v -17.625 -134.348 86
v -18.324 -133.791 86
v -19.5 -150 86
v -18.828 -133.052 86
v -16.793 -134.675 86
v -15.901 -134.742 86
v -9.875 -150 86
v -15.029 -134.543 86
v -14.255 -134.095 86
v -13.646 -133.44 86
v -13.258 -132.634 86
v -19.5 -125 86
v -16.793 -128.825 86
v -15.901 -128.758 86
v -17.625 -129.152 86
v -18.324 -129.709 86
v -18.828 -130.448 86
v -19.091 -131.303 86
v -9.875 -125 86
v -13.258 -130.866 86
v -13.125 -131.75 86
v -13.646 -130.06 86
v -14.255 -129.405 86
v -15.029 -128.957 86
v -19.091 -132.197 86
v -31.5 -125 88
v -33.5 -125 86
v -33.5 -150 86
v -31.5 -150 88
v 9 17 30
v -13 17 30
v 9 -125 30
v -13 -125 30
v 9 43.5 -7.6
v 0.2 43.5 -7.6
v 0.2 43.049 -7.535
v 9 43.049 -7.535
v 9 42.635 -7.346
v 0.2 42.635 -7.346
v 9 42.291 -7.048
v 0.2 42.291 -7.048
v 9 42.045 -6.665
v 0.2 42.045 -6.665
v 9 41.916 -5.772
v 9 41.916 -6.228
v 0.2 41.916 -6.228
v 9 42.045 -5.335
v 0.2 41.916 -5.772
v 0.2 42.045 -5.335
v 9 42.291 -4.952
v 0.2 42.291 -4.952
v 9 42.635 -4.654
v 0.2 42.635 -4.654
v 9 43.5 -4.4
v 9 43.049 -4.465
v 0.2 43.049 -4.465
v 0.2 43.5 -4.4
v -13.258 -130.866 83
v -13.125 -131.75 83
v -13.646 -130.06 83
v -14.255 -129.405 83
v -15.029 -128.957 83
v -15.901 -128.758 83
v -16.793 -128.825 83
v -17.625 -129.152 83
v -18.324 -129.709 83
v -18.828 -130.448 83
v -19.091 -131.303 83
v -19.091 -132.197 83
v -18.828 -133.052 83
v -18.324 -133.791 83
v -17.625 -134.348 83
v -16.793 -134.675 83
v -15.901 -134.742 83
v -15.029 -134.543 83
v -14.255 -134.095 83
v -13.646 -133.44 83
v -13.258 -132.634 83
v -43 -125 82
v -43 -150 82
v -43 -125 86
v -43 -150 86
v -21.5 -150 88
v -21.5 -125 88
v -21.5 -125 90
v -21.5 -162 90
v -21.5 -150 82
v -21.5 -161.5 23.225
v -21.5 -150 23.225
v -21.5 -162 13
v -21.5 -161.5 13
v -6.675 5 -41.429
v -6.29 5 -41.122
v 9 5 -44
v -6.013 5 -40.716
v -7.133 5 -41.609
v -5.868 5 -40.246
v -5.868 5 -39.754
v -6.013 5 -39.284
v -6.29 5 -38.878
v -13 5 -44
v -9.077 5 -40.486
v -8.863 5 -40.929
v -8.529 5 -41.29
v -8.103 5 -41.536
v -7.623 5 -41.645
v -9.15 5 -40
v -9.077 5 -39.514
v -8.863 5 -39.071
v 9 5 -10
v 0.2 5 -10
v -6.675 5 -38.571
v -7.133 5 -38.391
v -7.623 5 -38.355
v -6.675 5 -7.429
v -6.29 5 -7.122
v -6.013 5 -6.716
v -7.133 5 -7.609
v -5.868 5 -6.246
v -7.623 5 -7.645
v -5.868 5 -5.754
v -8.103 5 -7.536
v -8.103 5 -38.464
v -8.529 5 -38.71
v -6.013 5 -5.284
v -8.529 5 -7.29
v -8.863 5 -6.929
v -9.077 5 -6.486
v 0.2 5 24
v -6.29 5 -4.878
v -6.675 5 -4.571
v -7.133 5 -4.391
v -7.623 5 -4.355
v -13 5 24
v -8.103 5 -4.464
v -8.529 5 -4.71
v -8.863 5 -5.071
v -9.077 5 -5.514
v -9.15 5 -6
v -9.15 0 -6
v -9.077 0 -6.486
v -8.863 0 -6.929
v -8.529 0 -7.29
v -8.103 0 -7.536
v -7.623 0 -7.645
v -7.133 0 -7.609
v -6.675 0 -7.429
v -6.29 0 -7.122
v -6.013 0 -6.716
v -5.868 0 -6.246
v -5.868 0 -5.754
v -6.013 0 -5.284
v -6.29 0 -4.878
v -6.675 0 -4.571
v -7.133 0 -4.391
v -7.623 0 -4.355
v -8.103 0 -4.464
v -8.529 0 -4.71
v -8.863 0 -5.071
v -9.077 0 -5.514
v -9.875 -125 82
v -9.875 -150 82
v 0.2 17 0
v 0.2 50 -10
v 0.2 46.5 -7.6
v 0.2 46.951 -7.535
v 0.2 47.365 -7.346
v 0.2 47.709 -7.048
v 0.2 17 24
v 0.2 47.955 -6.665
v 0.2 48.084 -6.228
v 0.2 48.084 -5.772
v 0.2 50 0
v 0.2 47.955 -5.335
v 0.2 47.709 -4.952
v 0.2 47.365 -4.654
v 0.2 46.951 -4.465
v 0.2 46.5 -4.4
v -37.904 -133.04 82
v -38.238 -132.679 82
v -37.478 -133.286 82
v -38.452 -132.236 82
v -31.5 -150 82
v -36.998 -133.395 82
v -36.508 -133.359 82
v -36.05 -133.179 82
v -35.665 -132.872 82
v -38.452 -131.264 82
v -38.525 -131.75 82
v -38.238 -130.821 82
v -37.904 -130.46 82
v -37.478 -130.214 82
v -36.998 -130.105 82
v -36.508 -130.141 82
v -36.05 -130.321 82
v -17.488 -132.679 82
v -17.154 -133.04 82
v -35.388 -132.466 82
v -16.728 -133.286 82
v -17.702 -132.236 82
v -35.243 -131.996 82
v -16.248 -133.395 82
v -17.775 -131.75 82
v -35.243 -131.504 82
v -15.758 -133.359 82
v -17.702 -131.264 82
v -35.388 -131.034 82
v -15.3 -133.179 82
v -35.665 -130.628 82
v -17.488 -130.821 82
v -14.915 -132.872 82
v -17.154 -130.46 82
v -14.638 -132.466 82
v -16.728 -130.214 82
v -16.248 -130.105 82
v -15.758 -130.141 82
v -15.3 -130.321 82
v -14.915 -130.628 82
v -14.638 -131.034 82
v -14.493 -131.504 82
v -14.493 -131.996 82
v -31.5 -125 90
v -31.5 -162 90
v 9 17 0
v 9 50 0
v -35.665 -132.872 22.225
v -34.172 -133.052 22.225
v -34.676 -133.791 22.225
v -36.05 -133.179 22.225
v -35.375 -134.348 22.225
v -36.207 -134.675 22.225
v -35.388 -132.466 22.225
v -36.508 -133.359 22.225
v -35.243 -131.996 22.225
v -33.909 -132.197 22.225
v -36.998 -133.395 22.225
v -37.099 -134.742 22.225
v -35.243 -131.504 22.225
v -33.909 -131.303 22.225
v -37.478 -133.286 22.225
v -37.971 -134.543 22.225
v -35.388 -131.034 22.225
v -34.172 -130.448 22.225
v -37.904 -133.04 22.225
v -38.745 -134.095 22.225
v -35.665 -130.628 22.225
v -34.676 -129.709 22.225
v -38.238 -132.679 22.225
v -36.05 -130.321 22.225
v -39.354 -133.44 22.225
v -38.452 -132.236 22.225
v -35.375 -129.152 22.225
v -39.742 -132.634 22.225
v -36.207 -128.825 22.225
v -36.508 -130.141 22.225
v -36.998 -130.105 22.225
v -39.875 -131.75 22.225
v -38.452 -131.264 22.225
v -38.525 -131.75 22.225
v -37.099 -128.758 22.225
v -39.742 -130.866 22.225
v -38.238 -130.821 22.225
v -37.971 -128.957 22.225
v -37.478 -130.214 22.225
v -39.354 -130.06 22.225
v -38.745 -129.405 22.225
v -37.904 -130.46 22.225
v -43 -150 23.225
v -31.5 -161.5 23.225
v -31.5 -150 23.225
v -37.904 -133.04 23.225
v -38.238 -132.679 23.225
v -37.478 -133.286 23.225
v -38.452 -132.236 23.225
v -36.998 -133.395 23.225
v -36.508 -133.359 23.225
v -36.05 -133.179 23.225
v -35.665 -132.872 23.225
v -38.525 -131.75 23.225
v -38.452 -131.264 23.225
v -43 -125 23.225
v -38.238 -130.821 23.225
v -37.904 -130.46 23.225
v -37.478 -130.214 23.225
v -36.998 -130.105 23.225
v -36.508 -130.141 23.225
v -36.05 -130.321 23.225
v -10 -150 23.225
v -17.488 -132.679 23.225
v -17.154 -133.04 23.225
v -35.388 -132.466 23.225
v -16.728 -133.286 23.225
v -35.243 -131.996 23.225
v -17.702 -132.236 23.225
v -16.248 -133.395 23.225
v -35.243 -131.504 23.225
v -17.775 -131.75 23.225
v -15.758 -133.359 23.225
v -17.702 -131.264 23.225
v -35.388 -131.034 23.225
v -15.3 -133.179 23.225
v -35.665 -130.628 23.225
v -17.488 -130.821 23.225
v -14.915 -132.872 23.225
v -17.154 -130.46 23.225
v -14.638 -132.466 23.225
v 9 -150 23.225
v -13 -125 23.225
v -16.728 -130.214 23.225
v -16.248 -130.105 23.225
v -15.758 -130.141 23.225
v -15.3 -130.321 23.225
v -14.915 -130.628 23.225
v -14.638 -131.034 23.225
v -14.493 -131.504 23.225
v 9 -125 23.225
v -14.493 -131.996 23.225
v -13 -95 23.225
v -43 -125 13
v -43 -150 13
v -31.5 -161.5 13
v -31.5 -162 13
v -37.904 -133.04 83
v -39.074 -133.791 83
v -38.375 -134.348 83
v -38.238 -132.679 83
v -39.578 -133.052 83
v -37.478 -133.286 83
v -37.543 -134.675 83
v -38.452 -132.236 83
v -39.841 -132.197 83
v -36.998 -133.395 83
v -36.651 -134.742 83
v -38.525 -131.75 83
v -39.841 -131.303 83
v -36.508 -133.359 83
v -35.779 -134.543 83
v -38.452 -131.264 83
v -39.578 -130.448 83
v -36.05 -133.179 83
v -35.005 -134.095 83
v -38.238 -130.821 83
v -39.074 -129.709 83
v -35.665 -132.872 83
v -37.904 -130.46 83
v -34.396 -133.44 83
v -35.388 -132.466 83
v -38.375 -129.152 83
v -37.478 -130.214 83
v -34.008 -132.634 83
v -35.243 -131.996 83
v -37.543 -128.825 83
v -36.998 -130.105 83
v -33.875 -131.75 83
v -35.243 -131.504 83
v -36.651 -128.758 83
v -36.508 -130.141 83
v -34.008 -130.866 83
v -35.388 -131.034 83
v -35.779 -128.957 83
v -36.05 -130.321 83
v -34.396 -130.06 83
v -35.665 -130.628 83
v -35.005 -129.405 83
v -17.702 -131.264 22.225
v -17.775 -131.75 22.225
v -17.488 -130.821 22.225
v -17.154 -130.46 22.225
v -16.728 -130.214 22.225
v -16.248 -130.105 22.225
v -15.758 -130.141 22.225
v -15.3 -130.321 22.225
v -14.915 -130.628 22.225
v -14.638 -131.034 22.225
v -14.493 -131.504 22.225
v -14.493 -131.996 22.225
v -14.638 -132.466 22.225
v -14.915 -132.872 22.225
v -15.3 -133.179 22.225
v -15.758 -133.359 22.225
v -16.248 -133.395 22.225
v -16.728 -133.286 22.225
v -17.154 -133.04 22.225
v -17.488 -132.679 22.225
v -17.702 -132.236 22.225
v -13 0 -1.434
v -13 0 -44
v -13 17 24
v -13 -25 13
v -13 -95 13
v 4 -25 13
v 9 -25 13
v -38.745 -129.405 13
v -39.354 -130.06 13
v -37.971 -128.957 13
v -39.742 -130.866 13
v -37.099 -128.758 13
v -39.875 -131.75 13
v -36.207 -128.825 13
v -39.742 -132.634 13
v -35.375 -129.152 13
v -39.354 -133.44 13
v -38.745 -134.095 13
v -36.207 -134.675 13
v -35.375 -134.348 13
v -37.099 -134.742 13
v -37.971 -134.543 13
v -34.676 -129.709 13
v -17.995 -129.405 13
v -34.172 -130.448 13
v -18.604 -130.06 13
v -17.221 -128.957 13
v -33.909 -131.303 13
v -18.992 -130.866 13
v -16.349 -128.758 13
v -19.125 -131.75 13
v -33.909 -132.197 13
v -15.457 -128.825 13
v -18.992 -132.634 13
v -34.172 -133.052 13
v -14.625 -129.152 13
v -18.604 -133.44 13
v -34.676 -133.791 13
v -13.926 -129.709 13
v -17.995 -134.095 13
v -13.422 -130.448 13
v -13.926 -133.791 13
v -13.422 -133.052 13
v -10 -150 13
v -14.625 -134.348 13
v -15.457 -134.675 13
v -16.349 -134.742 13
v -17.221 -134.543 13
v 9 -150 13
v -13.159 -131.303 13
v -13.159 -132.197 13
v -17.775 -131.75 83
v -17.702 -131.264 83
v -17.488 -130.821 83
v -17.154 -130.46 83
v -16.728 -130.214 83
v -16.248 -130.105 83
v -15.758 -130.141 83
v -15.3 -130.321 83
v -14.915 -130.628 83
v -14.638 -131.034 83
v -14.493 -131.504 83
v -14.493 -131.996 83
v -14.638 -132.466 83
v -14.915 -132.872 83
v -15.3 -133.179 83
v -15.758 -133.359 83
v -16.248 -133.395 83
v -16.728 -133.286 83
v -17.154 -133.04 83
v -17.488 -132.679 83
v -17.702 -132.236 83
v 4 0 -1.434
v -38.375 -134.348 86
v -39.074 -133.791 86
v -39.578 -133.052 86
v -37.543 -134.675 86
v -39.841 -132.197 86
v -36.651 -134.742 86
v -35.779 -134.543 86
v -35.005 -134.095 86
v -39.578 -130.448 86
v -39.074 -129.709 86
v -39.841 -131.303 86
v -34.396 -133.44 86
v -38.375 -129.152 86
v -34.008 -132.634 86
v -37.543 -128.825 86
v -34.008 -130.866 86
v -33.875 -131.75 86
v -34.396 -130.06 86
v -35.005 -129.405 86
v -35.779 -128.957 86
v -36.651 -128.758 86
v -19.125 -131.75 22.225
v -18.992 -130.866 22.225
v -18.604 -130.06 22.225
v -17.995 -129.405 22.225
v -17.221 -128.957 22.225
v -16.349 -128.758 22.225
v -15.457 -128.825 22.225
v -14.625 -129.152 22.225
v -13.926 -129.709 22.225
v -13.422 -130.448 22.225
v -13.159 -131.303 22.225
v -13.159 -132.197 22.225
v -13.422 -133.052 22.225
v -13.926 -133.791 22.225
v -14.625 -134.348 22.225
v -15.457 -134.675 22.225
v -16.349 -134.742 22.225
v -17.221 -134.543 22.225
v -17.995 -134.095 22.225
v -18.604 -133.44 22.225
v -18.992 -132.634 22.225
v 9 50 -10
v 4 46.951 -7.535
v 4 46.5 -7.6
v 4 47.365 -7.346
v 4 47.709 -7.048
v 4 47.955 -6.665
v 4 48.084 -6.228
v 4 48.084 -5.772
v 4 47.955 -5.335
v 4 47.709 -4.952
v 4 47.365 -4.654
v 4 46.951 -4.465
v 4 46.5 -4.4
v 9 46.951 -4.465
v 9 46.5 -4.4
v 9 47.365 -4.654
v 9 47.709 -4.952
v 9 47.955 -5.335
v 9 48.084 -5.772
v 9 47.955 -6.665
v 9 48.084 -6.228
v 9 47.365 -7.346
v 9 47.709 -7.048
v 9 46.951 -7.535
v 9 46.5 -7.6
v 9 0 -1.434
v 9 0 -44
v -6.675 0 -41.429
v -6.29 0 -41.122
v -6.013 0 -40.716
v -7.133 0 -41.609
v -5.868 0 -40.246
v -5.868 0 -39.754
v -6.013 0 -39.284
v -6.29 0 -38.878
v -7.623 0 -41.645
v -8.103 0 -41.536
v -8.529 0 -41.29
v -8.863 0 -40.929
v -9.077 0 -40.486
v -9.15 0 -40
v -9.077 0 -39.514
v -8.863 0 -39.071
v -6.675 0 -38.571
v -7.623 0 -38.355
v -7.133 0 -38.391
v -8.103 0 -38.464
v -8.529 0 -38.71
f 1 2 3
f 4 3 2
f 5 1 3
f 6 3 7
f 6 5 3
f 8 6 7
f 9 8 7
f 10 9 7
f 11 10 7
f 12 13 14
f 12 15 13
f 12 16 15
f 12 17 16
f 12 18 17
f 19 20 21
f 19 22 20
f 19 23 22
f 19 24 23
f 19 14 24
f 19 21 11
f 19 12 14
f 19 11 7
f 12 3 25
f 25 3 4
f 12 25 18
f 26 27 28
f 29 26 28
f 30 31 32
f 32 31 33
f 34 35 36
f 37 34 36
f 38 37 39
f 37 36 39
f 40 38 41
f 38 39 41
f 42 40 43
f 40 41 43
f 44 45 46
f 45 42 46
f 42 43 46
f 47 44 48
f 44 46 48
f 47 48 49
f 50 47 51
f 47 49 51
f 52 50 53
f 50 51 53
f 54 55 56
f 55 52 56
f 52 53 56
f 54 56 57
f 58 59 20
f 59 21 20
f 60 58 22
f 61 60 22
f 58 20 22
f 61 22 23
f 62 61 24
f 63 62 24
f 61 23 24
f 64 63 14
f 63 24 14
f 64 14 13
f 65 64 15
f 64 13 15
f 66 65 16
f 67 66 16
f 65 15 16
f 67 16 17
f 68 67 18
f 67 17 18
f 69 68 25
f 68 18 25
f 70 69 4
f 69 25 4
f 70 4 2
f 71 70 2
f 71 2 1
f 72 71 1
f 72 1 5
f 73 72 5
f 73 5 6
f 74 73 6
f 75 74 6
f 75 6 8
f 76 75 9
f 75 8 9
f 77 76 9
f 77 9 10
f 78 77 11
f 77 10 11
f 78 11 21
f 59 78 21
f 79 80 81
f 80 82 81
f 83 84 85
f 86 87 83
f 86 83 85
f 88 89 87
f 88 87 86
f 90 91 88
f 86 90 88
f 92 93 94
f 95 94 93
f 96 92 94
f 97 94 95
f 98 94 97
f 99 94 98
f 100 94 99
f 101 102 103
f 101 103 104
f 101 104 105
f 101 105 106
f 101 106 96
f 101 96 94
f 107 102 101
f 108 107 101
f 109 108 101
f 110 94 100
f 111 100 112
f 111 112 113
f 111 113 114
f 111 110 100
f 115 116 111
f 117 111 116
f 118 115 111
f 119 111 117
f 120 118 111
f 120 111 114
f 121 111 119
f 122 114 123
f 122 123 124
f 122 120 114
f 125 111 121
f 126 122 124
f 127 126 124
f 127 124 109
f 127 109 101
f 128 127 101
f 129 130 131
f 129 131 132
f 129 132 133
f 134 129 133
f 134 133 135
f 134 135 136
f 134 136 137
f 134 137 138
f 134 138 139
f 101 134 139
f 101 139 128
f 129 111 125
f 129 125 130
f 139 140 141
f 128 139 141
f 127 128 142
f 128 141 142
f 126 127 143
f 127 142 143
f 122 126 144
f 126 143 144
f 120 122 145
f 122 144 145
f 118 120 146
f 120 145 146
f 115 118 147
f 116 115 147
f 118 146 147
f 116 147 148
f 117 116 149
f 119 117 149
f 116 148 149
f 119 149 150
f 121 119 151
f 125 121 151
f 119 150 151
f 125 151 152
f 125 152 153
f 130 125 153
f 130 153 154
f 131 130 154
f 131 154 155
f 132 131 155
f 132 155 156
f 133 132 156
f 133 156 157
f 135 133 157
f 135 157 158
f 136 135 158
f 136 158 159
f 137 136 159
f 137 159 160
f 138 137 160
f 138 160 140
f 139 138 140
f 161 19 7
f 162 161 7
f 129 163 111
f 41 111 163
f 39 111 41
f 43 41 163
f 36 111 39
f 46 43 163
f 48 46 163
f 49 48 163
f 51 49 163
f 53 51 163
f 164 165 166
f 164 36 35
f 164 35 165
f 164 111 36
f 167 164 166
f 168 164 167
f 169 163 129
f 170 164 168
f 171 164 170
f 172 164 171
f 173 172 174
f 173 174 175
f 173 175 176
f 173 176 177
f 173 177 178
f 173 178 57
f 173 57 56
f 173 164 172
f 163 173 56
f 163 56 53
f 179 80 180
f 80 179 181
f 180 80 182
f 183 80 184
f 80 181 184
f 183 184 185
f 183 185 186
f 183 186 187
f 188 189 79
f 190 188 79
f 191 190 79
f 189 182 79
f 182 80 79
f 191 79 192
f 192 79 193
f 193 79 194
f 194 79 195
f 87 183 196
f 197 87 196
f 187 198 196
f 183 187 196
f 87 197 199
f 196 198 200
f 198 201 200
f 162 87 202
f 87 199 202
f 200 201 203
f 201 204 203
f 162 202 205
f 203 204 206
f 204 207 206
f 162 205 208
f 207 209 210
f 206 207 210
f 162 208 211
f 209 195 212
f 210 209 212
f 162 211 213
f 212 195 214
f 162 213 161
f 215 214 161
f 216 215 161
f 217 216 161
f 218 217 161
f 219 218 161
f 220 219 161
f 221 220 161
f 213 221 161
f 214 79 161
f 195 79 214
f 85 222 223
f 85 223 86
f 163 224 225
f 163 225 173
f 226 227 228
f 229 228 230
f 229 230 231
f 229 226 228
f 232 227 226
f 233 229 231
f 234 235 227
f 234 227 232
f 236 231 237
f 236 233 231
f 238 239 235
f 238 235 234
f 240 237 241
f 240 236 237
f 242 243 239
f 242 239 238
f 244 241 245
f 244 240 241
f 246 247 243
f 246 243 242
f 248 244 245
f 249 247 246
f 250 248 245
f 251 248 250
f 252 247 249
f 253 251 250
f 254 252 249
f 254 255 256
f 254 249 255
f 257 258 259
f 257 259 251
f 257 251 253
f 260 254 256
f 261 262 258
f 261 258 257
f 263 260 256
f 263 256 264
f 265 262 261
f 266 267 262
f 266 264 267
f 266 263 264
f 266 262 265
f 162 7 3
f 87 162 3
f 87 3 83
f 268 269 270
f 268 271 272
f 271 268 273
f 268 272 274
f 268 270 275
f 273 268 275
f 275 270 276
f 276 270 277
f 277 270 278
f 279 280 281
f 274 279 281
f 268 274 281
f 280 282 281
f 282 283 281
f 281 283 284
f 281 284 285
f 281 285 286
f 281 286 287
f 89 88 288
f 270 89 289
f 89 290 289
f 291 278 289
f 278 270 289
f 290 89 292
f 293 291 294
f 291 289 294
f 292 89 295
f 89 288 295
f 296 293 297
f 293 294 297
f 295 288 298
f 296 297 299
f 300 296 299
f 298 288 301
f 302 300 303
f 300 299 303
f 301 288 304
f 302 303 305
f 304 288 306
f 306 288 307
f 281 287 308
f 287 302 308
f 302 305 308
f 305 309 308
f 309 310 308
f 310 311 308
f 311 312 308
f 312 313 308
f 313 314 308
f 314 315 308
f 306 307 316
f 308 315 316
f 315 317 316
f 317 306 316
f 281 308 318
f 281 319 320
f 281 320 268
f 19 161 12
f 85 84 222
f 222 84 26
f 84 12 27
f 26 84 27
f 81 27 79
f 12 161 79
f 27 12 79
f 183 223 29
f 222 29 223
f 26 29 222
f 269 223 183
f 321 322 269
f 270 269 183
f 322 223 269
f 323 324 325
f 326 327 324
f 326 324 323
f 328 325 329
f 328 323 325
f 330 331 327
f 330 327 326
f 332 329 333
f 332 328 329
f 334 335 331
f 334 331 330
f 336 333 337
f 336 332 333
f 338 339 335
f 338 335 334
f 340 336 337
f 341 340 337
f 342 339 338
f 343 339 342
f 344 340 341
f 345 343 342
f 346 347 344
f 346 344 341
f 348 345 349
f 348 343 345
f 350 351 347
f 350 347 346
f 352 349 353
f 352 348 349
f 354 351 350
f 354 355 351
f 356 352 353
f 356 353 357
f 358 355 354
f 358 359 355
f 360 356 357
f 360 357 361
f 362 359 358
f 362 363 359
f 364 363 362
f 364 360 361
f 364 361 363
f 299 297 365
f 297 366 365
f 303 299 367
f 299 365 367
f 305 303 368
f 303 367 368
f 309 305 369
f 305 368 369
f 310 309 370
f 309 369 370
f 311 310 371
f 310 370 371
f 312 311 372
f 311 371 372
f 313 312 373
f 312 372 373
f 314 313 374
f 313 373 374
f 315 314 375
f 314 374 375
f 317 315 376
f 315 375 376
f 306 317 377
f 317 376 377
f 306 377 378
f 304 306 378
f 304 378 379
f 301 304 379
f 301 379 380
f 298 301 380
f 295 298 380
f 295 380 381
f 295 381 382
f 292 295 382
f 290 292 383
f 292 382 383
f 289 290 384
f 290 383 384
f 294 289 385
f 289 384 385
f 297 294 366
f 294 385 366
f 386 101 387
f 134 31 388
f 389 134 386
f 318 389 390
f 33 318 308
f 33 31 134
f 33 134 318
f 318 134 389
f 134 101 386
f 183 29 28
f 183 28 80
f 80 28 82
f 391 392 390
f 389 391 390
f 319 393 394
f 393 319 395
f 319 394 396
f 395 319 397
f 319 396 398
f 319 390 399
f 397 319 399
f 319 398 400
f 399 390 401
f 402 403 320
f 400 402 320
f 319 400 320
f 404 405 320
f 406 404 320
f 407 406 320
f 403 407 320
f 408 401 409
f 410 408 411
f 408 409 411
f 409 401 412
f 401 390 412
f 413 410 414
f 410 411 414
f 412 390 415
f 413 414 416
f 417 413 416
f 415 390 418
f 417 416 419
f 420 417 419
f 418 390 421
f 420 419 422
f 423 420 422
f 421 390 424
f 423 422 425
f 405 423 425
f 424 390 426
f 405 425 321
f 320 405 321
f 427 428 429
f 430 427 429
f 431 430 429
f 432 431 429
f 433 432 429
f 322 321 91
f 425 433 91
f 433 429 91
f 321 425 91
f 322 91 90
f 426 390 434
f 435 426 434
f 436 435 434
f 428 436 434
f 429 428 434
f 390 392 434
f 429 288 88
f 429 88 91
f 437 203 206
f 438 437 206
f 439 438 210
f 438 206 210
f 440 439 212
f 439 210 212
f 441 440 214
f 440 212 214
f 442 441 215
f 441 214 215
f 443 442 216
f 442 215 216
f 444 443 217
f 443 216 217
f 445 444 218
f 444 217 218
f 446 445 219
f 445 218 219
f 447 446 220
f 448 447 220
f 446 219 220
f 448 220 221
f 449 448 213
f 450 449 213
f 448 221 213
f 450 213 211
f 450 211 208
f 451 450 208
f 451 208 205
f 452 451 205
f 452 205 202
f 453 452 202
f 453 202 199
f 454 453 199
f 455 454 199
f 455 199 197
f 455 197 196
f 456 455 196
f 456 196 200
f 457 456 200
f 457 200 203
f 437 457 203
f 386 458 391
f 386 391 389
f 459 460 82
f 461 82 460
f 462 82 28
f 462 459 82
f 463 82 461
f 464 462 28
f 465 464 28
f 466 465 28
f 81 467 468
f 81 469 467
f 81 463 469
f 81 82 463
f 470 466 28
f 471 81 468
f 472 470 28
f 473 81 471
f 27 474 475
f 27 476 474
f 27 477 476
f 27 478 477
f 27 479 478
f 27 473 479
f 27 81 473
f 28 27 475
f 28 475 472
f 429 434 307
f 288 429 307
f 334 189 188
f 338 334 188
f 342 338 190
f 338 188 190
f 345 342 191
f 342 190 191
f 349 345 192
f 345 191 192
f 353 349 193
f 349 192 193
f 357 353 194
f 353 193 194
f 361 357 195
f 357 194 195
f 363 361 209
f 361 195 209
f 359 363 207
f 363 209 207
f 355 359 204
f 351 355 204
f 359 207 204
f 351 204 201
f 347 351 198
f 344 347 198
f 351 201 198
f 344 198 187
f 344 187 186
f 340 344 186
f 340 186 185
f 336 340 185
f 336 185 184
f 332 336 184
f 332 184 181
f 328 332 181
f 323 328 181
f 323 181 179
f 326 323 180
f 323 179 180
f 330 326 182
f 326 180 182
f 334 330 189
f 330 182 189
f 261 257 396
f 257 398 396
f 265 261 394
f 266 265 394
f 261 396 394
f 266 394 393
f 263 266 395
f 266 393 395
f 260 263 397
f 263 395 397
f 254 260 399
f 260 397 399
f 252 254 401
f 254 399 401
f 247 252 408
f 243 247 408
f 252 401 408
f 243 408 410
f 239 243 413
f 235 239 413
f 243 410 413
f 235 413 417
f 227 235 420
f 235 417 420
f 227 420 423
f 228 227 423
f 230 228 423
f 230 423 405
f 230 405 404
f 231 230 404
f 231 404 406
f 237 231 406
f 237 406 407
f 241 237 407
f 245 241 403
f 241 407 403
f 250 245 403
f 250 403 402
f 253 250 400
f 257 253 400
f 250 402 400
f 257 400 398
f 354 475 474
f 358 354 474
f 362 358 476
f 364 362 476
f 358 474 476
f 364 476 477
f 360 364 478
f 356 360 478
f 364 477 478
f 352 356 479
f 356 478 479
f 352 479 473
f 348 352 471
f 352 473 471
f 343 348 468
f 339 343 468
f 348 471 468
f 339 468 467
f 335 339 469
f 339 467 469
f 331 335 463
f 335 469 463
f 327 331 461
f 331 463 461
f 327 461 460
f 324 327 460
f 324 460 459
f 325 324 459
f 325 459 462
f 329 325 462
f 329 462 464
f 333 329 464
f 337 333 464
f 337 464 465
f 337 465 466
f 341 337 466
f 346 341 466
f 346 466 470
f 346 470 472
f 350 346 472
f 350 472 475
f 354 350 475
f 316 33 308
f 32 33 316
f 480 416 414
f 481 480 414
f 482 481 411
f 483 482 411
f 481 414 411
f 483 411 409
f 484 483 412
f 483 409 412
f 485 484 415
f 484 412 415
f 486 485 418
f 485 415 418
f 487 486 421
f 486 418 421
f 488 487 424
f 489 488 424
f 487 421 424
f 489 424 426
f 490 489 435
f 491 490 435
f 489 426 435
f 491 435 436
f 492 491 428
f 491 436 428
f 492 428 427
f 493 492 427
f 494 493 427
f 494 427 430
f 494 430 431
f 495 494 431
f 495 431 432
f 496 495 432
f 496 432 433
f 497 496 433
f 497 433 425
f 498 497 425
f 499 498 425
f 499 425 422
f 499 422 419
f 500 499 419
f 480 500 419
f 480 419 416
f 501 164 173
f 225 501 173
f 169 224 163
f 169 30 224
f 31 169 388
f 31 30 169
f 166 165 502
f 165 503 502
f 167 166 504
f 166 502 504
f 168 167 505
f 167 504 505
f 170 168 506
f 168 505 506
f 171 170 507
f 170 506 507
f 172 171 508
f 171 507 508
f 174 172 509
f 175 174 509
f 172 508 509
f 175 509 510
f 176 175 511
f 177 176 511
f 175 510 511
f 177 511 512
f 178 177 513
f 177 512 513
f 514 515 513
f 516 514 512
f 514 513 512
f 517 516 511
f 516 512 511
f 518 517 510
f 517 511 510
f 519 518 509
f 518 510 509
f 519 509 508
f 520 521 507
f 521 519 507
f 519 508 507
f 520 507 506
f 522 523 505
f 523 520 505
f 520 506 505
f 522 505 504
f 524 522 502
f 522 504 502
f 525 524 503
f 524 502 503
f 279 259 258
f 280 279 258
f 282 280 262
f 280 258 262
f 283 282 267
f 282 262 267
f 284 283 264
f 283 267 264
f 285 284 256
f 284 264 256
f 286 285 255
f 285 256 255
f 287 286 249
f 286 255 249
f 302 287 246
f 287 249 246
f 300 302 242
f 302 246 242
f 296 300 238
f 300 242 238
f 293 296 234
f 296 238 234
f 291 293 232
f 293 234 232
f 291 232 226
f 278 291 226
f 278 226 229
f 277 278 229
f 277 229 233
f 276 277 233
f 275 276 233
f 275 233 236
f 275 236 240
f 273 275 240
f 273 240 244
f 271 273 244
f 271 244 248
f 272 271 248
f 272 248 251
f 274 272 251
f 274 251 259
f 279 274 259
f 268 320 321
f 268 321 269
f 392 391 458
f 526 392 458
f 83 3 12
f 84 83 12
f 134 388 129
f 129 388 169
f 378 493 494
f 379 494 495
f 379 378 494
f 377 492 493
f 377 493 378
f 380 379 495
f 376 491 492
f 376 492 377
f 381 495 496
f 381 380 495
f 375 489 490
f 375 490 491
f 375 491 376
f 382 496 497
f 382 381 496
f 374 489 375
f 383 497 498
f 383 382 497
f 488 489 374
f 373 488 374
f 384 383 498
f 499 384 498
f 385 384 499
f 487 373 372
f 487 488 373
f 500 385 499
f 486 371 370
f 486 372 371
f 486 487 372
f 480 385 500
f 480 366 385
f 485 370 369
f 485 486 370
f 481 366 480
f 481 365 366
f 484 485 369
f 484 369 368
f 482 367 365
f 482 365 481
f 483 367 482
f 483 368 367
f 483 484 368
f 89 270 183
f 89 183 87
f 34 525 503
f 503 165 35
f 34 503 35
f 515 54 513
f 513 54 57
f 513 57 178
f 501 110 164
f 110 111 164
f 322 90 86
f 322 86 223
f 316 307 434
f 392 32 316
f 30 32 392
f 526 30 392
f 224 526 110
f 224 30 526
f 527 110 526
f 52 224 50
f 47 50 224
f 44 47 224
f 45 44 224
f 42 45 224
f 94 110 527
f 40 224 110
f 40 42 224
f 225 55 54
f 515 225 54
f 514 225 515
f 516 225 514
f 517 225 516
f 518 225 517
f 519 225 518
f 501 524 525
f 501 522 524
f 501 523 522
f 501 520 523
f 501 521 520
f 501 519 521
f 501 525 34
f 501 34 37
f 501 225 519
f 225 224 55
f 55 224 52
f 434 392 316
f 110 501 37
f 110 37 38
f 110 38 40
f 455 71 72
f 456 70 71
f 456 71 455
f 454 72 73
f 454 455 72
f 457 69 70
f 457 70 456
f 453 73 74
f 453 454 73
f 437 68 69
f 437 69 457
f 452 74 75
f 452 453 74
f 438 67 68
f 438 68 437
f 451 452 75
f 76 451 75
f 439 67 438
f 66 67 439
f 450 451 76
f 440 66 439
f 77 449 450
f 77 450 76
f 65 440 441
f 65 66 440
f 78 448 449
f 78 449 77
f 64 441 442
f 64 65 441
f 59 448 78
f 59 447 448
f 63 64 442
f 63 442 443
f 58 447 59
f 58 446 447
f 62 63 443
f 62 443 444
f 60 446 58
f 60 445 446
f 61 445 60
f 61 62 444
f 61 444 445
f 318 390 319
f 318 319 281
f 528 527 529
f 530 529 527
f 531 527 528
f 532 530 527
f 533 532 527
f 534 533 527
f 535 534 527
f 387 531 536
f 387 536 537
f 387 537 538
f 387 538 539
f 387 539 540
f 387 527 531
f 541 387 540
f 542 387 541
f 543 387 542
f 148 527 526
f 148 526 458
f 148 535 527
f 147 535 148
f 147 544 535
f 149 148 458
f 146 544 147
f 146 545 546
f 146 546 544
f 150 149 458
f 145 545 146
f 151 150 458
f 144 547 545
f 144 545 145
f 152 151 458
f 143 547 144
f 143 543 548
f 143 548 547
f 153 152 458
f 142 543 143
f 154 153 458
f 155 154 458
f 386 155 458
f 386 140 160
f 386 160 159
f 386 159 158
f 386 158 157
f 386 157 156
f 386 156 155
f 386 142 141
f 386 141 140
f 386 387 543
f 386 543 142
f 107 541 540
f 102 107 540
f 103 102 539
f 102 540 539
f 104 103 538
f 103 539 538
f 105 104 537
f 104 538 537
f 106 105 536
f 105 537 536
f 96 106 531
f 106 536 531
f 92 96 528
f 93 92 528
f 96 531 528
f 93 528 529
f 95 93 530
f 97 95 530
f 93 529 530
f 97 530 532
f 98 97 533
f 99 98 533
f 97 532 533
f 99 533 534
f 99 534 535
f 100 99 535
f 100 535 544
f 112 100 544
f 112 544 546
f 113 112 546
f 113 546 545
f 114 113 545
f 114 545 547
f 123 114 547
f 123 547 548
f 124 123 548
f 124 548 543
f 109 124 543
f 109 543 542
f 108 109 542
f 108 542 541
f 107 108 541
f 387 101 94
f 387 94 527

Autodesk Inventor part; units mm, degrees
ref_plane "YZ Plane" through (0, 0, 0) normal (1, 0, 0) x (0, 1, 0)
ref_plane "XZ Plane" through (0, 0, 0) normal (0, 1, 0) x (-1, 0, 0)
ref_plane "XY Plane" through (0, 0, 0) normal (0, 0, 1) x (1, 0, 0)
sketch "Sketch1" plane through (0, 0, 0) normal (0, 1, 0) x (-1, 0, 0)
  line L0 (0, 0) -> (13, 0)
  line L1 (13, 0) -> (13, -44)
  line L2 (13, -44) -> (0, -44)
  line L3 (0, -44) -> (0, 0)
  line L4 (13, 0) -> (13, -6)
  line L5 (13, -6) -> (7.5, -6)
  line L6 (7.5, -6) -> (7.5, -40)
  circle A0 centre (7.5, -6) radius 1.65
  circle A1 centre (7.5, -40) radius 1.65
  dimension "d0" = 13
  dimension "d1" = 44
  dimension "d2" = 6
  dimension "d3" = 5.5
  dimension "d4" = 34
  dimension "d5" = 3.3
  dimension "d6" = 3.3
extrude "Extrusion1" add sketch "Sketch1" along normal blind 5
sketch "Sketch2" plane through (0, 0, 0) normal (1, 0, 0) x (0, 0, -1)
  line L0 (0, 5) -> (44, 5) projected
  line L1 (0, 5) -> (44, 5)
  line L2 (44, 5) -> (44, 50)
  line L3 (44, 50) -> (0, 50)
  line L4 (0, 50) -> (0, 5)
  line L5 (0, 0) -> (44, 0)
  line L6 (44, 0) -> (44, 5)
  line L7 (44, 5) -> (0, 5)
  line L8 (0, 5) -> (0, 0)
  line L9 (0, 50) -> (10, 50)
  line L10 (10, 50) -> (10, 5)
  line L11 (10, 5) -> (0, 5)
  line L12 (0, 5) -> (0, 50)
  dimension "d9" = 44
  dimension "d10" = 45
  dimension "d11" = 10
extrude "Extrusion2" add sketch "Sketch2" along normal blind 4 contours L4 L3 L10 L0 | L0 L6 L5 L8
sketch "Sketch3" plane through (4, 0, 0) normal (1, 0, 0) x (0, 0, -1)
  line L0 (44, 5) -> (10, 5) projected
  line L1 (10, 5) -> (10, 45)
  line L2 (10, 5) -> (10, 50) projected
  line L3 (0, 50) -> (0, 5) projected
  line L4 (0, 45) -> (4.4, 45)
  line L5 (6, 45) -> (6, 46.5)
  line L6 (6, 45) -> (6, 43.5)
  line L7 (4.4, 46.5) -> (4.4, 43.5)
  line L8 (7.6, 46.5) -> (7.6, 43.5)
  arc A0 (5.4432, 45) -> (6, 44.9) centre (6, 46.5) ccw
  arc A1 (6.5568, 45) -> (4.4, 46.5) centre (6, 46.5) ccw
  line L9 (10, 45) -> (6.5568, 45)
  line L10 (5.4432, 45) -> (0, 45)
  arc A2 (6, 45.1) -> (5.4432, 45) centre (6, 43.5) ccw
  arc A3 (4.4, 43.5) -> (7.6, 43.5) centre (6, 43.5) ccw
  point P0 (0, 0)
  dimension "d14" = 40
  dimension "d15" = 6
  dimension "d16" = 1.5
  dimension "d17" = 1.5
extrude "Extrusion3" cut sketch "Sketch3" against normal blind 4 contours L6 A0 A2 L5 | A1 L9 L8 A3 L7 | L8 L9 A1
sketch "Sketch4" plane through (-13, 0, 0) normal (0, 0, 1) x (1, 0, 0)
  line L0 (0, 0) -> (17, 0) projected
  line L1 (17, 0) -> (17, 5) projected
  line L2 (0, 0) -> (17, 0)
  line L3 (17, 0) -> (17, 5)
  line L4 (17, 5) -> (0, 5)
  line L5 (0, 5) -> (0, 0)
  line L6 (13, 50) -> (13, 5) projected
  line L7 (17, 0) -> (13, 0)
  line L8 (13, 0) -> (13, 17)
  line L9 (13, 17) -> (17, 17)
  line L10 (17, 17) -> (17, 0)
  dimension "d22" = 17
extrude "Extrusion4" add sketch "Sketch4" along normal blind 30
sketch "Sketch5" plane through (0, 0, 0) normal (0, -1, 0) x (1, 0, 0)
  line L0 (-13, -44) -> (-13, 30) projected
  line L1 (-13, 30) -> (4, 30)
  line L2 (4, 30) -> (4, 13)
  line L3 (4, 13) -> (-13, 13)
  line L4 (-13, 13) -> (-13, 30)
  point P0 (0, 0)
  dimension "d25" = 17
  dimension "d26" = 17
extrude "Extrusion5" add sketch "Sketch5" along normal blind 150
sketch "Sketch7" plane through (0, -150, 0) normal (0, -1, 0) x (1, 0, 0)
  line L0 (4, 13) -> (-13, 13) projected
  line L1 (0, 30) -> (0, -10) projected
  line L2 (0, 13) -> (0, 30)
  line L3 (0, 30) -> (0, 52.6)
  circle A0 centre (-36, 52.6) radius 9
  line L4 (-36, 52.6) -> (-36, 36.6)
  line L5 (-36, 36.6) -> (-20, 36.6)
  line L6 (-36, 52.6) -> (-36, 68.6)
  line L7 (-36, 68.6) -> (-52, 68.6)
  line L8 (-52, 68.6) -> (-20, 68.6)
  line L9 (-20, 68.6) -> (-20, 36.6)
  line L10 (-20, 36.6) -> (-52, 36.6)
  line L11 (-52, 36.6) -> (-52, 68.6)
  circle A1 centre (-20, 68.6) radius 1.1
  circle A2 centre (-20, 36.6) radius 1.1
  circle A3 centre (-52, 36.6) radius 1.1
  circle A4 centre (-52, 68.6) radius 1.1
  circle A5 centre (-20, 68.6) radius 4
  circle A6 centre (-20, 36.6) radius 4
  line L12 (-52, 65.6) -> (-52, 70.6)
  line L13 (-52, 36.6) -> (-52, 42.6)
  circle A7 centre (-52, 68.6) radius 4
  circle A8 centre (-52, 36.6) radius 4
  point P0 (0, 0)
  point P1 (-20, 64.6)
  point P2 (-20, 40.6)
  dimension "d29" = 22.6
  dimension "d31" = 18
  dimension "d32" = 16
  dimension "d33" = 16
  dimension "d34" = 16
  dimension "d35" = 16
  dimension "d36" = 2.2
  dimension "d37" = 2.2
  dimension "d39" = 2.2
  dimension "d40" = 8
  dimension "d43" = 8
  dimension "d49" = 8
  dimension "d50" = 8
sketch "Sketch14" plane through (0, -150, 0) normal (0, -1, 0) x (1, 0, 0)
  line L0 (4, 13) -> (4, 30) projected
  line L1 (4, 13) -> (4, 52.6)
  line L2 (4, 52.6) -> (-26.5, 52.6)
  line L3 (-26.5, 52.6) -> (-26.5, 35.35)
  line L4 (-26.5, 35.35) -> (-9.25, 35.35)
  line L5 (-26.5, 52.6) -> (-43.75, 52.6)
  line L6 (-43.75, 52.6) -> (-43.75, 69.85)
  line L7 (-43.75, 69.85) -> (-9.25, 69.85)
  line L8 (-9.25, 69.85) -> (-9.25, 35.35)
  line L9 (-9.25, 35.35) -> (-43.75, 35.35)
  line L10 (-43.75, 35.35) -> (-43.75, 69.85)
  circle A0 centre (-43.75, 69.85) radius 0.95
  circle A1 centre (-9.25, 69.85) radius 0.95
  circle A2 centre (-9.25, 35.35) radius 0.95
  circle A3 centre (-43.75, 35.35) radius 0.95
  circle A4 centre (-43.75, 69.85) radius 4
  circle A5 centre (-9.25, 69.85) radius 4
  circle A6 centre (-9.25, 35.35) radius 4
  circle A7 centre (-43.75, 35.35) radius 4
  point P0 (0, 0)
  dimension "d91" = 39.6
  dimension "d92" = 30.5
  dimension "d93" = 17.25
  dimension "d94" = 17.25
  dimension "d95" = 17.25
  dimension "d96" = 17.25
  dimension "d97" = 1.9
  dimension "d98" = 1.9
  dimension "d99" = 1.9
  dimension "d100" = 1.9
  dimension "d101" = 8
  dimension "d102" = 8
  dimension "d103" = 8
  dimension "d104" = 8
extrude "Extrusion14" add sketch "Sketch14" against normal blind 6 contours A5 L7 A1 L8 | L8 A1 L7 A5 | A6 L4 A2 L8 | L8 A2 L4 A6 | A7 L10 A3 L9 | L9 A3 L10 A7 | A4 L7 A0 L6 | L6 A0 L7 A4
sketch "Sketch15" plane through (-9.25, -150, 69.85) normal (0, -1, 0) x (1, 0, 0)
  circle A0 centre (0, 0) radius 4 projected
  line L0 (0, 4) -> (10, 4)
  line L1 (10, 4) -> (10, -4)
  line L2 (10, -4) -> (0, -4)
  line L3 (0, -4) -> (0, 4)
  circle A1 centre (0, -34.5) radius 4 projected
  line L4 (0, -30.5) -> (10, -30.5)
  line L5 (10, -30.5) -> (10, -38.5)
  line L6 (10, -38.5) -> (0, -38.5)
  line L7 (0, -38.5) -> (0, -30.5)
  circle A2 centre (-34.5, -34.5) radius 4 projected
  line L8 (-34.5, -38.5) -> (-44.5, -38.5)
  line L9 (-44.5, -38.5) -> (-44.5, -30.5)
  line L10 (-44.5, -30.5) -> (-34.5, -30.5)
  line L11 (-34.5, -30.5) -> (-34.5, -38.5)
  circle A3 centre (-34.5, 0) radius 4 projected
  line L12 (-34.5, -4) -> (-44.5, -4)
  line L13 (-44.5, -4) -> (-44.5, 4)
  line L14 (-44.5, 4) -> (-34.5, 4)
  line L15 (-34.5, 4) -> (-34.5, -4)
  line L16 (-44.5, 4) -> (-38.5, 4)
  line L17 (-38.5, 4) -> (-38.5, -38.5)
  line L18 (-38.5, -38.5) -> (-44.5, -38.5)
  line L19 (-44.5, -38.5) -> (-44.5, 4)
  line L20 (10, 4) -> (4, 4)
  line L21 (4, 4) -> (4, -38.5)
  line L22 (4, -38.5) -> (10, -38.5)
  line L23 (10, -38.5) -> (10, 4)
  point P0 (9.25, -69.85)
  point P1 (-38.5, -4)
  point P2 (-34.5, 4)
  point P3 (-34.5, -30.5)
  point P4 (-38.5, -30.5)
  point P5 (0, -4)
  point P6 (4, -4)
  point P7 (4, -30.5)
  point P8 (0, -38.5)
  point P9 (10, -4)
  dimension "d107" = 10
  dimension "d108" = 8
  dimension "d109" = 10
  dimension "d110" = 8
  dimension "d111" = 10
  dimension "d112" = 8
  dimension "d113" = 10
  dimension "d114" = 8
  dimension "d115" = 6
  dimension "d116" = 6
extrude "Extrusion15" add sketch "Sketch15" against normal blind 6 contours L21 L2 A0 | A0 L0 L21 | L21 L0 L1 L2 | L2 L23 L4 L21 | L21 A1 L4 | L4 L5 L6 L21 | L21 L6 A1 | A2 L17 L10 | L8 L17 A2 | L17 L8 L9 L10 | L10 L19 L12 L17 | L17 A3 L12 | L12 L13 L14 L17 | L17 L14 A3
sketch "Sketch16" plane through (0, -150, 0) normal (0, -1, 0) x (1, 0, 0)
  line L0 (0.75, 73.85) -> (0.75, 31.35) projected
  line L1 (0.75, 73.85) -> (-51.25, 73.85)
  line L2 (-51.25, 73.85) -> (-51.25, 81.85)
  line L3 (-51.25, 81.85) -> (0.75, 81.85)
  line L4 (0.75, 81.85) -> (0.75, 73.85)
  line L5 (0.75, 31.35) -> (-9.25, 31.35) projected
  line L6 (0.75, 31.35) -> (-51.25, 31.35)
  line L7 (-51.25, 31.35) -> (-51.25, 23.35)
  line L8 (-51.25, 23.35) -> (0.75, 23.35)
  line L9 (0.75, 23.35) -> (0.75, 31.35)
  point P0 (0, 0)
  dimension "d119" = 8
  dimension "d120" = 8
extrude "Extrusion16" add sketch "Sketch16" against normal blind 6
sketch "Sketch17" plane through (0, -144, 0) normal (0, 1, 0) x (1, 0, 0)
  line L0 (0.75, -81.85) -> (0.75, -30) projected
  line L1 (4, -30) -> (0, -30) projected
  line L2 (0.75, -81.85) -> (4, -81.85)
  line L3 (4, -81.85) -> (4, -30)
  line L4 (4, -30) -> (0.75, -30)
  line L5 (0.75, -30) -> (0.75, -81.85)
  line L6 (-51.25, -23.35) -> (-51.25, -81.85) projected
  line L7 (-51.25, -23.35) -> (-13, -23.35)
  line L8 (-13, -23.35) -> (-13, -13)
  line L9 (-13, -13) -> (-51.25, -13)
  line L10 (-51.25, -13) -> (-51.25, -23.35)
  point P0 (0, 0)
  point P1 (0.75, -30)
  point P2 (0.75, -30)
extrude "Extrusion17" add sketch "Sketch17" against normal blind 6
chamfer "Chamfer4" distance 50 angle 30 1 edges at (-13, -144, 21.5) measured on face at (-13, -46.3333, 24.3333)
chamfer "Chamfer5" distance 25 angle 30 1 edges at (-4.5, 0, 13) measured on face at (-1.6667, -81.3333, 13)
sketch "Sketch19" plane through (-13, 0, 30) normal (0, 0, 1) x (1, 0, 0)
  line L0 (13, 17) -> (13, 5) projected
  line L1 (0, 0) -> (0, 5) projected
  line L2 (13, 17) -> (0, 17)
  line L3 (0, 17) -> (0, 5)
  line L4 (0, 5) -> (13, 5)
  line L5 (13, 5) -> (13, 17)
  point P0 (13, 0)
extrude "Extrusion18" add sketch "Sketch19" against normal blind 6
sketch "Sketch20" plane through (-51.25, -150, 13) normal (-1, 0, 0) x (0, 0, 1)
  line L0 (0, 125) -> (0, 0) projected
  line L1 (60.85, 6) -> (68.85, 6) projected
  line L2 (0, 0) -> (68.85, 0)
  line L3 (68.85, 0) -> (68.85, 6)
  line L4 (68.85, 6) -> (0, 6)
  line L5 (0, 6) -> (0, 0)
  point P0 (-13, 150)
extrude "Extrusion19" add sketch "Sketch20" along normal blind 3
sketch "Sketch21" plane through (0, 0, 0) normal (-1, 0, 0) x (0, 0, 1)
  line L0 (-10, 5) -> (-10, 50) projected
  line L1 (24, 5) -> (-10, 5) projected
  line L2 (-10, 50) -> (24, 50)
  line L3 (24, 50) -> (24, 5)
  line L4 (24, 5) -> (-10, 5)
  line L5 (-10, 5) -> (-10, 50)
  point P0 (0, 0)
extrude "Extrusion20" cut sketch "Sketch21" against normal blind 0.2
chamfer "Chamfer6" distance 2 angle 15 1 edges at (-10.2, -150, 69.85) measured on face at (-8.3489, -146, 69.5492)
chamfer "Chamfer7" distance 2 angle 15 1 edges at (-10.2, -150, 35.35) measured on face at (-8.6492, -146, 36.0859)
chamfer "Chamfer8" distance 2 angle 15 1 edges at (-44.7, -150, 35.35) measured on face at (-43.7117, -146, 34.4008)
chamfer "Chamfer9" distance 2 angle 15 1 edges at (-44.7, -150, 69.85) measured on face at (-42.8489, -146, 69.5492)
sketch "Sketch22" plane through (4, 0, 0) normal (1, 0, 0) x (0, 0, -1)
  line L0 (44, 0) -> (1.4338, 0) projected
  line L1 (-30, 17) -> (-30, -144) projected
  line L2 (44, 0) -> (-30, 0)
  line L3 (-30, 0) -> (-30, 17)
  line L4 (-30, 17) -> (44, 17)
  line L5 (44, 17) -> (44, 0)
  line L6 (10, 50) -> (0, 50) projected
  line L7 (10, 50) -> (0, 50)
  line L8 (0, 50) -> (0, 0)
  line L9 (0, 0) -> (10, 0)
  line L10 (10, 0) -> (10, 50)
  line L11 (10, 5) -> (10, 50) projected
  line L12 (44, 17) -> (10, 17)
  line L13 (10, 17) -> (10, 5)
  line L14 (10, 5) -> (44, 5)
  line L15 (44, 5) -> (44, 17)
  arc A0 (4.4, 43.5) -> (7.6, 43.5) centre (6, 43.5) ccw projected
  circle A1 centre (6, 43.5) radius 1.6
  arc A2 (7.6, 46.5) -> (4.4, 46.5) centre (6, 46.5) ccw projected
  circle A3 centre (6, 46.5) radius 1.6
  line L16 (7.6, 46.5) -> (7.6, 43.5) projected
  line L17 (7.6, 46.5) -> (7.6, 43.5)
  line L18 (7.6, 43.5) -> (4.4, 43.5)
  line L19 (4.4, 43.5) -> (4.4, 46.5) projected
  line L20 (4.4, 46.5) -> (4.4, 43.5)
  point P0 (0, 17)
  point P1 (1.4338, 0)
extrude "Extrusion21" add sketch "Sketch22" along normal blind 5 contours L0 L10 L14 L5 | L0 L2 L8 L4 L10 | L2 L1 L4 L8 | L4 L8 L6 L10
sketch "Sketch23" plane through (4, 0, 0) normal (1, 0, 0) x (0, 0, -1)
  line L0 (-13, -25) -> (-13, -94) projected
  line L1 (-13, -25) -> (1.4338, 0) projected
  line L2 (-13, -25) -> (1.4338, 0)
  line L3 (-30, 0) -> (44, 0) projected
  line L4 (1.4338, 0) -> (-30, 0)
  line L5 (-30, 0) -> (-30, -144) projected
  line L6 (-30, 0) -> (-30, -144)
  line L7 (-81.85, -144) -> (-13, -144) projected
  line L8 (-30, -144) -> (-13, -144)
  line L9 (-13, -144) -> (-13, -25)
  point P0 (0, 0)
extrude "Extrusion22" add sketch "Sketch23" along normal blind 5
sketch "Sketch24" plane through (0, -150, 0) normal (0, -1, 0) x (1, 0, 0)
  circle A0 centre (-9.25, 69.85) radius 0.95 projected
  circle A1 centre (-43.75, 69.85) radius 0.95 projected
  line L0 (-9.25, 69.85) -> (-43.75, 69.85)
  line L1 (-26.5, 69.85) -> (-26.5, 28.2392)
  circle A2 centre (-43.75, 35.35) radius 0.95 projected
  line L2 (-43.75, 69.85) -> (-43.75, 35.35)
  line L3 (-43.75, 52.6) -> (-12.0502, 52.6)
  circle A3 centre (-26.5, 52.6) radius 1.7553
  point P0 (0, 0)
extrude "Extrusion23" add sketch "Sketch24" against normal blind 10 contours A3 L3 L1 | L1 L3 A3 | L3 L1 A3 | L3 A3 L1
sketch "Sketch25" plane through (0, -144, 0) normal (0, 1, 0) x (1, 0, 0)
  line L0 (4, -81.85) -> (4, -30) projected
  line L1 (4, -30) -> (-54.25, -30)
  line L2 (-54.25, -30) -> (-54.25, -81.85)
  line L3 (-54.25, -81.85) -> (4, -81.85)
  line L4 (4, -81.85) -> (4, -30)
  line L5 (-54.25, -81.85) -> (-54.25, -13) projected
  line L6 (-41.8675, -13) -> (-41.8675, -30) projected
  line L7 (-54.25, -13) -> (-41.8675, -13)
  line L8 (-41.8675, -13) -> (-41.8675, -30)
  line L9 (-41.8675, -30) -> (-54.25, -30)
  line L10 (-54.25, -30) -> (-54.25, -13)
  point P0 (0, 0)
extrude "Extrusion24" cut sketch "Sketch25" against normal blind 10
sketch "Sketch26" plane through (4, 0, 0) normal (1, 0, 0) x (0, 0, -1)
  line L0 (-13, -144) -> (-13, -150) projected
  line L1 (-30, -150) -> (-13, -150)
  line L2 (-13, -150) -> (-13, -144)
  line L3 (-13, -144) -> (-30, -144)
  line L4 (-30, -144) -> (-30, -150)
  point P0 (0, 0)
extrude "Extrusion25" add sketch "Sketch26" along normal blind 5
sketch "Sketch27" plane through (-13, 0, 30) normal (0, 0, 1) x (1, 0, 0)
  line L0 (0, -94) -> (-28.8675, -144) projected
  line L1 (22, -150) -> (-28.8675, -150) projected
  line L2 (0, -94) -> (-28.8675, -94)
  line L3 (-28.8675, -94) -> (-28.8675, -150)
  line L4 (-28.8675, -150) -> (0, -150)
  line L5 (0, -150) -> (0, -94)
  point P0 (13, 0)
  point P1 (0, -150)
extrude "Extrusion26" cut sketch "Sketch27" against normal blind 65 contours L5 L1 L3 L0
sketch "Sketch28" plane through (-13, 0, 30) normal (0, 0, 1) x (1, 0, 0)
  line L0 (22, -150) -> (0, -150) projected
  line L1 (0, 17) -> (0, -150) projected
  line L2 (22, -150) -> (0, -150)
  line L3 (0, -150) -> (0, -125)
  line L4 (0, -125) -> (22, -125)
  line L5 (22, -125) -> (22, -150)
  point P0 (13, 0)
  dimension "d165" = 25
extrude "Extrusion27" cut sketch "Sketch28" against normal blind 6.775
sketch "Sketch30" plane through (-13, 0, -44) normal (-1, 0, 0) x (0, 0, 1)
  line L0 (57, -25) -> (57, -150) projected
  line L1 (67.225, -125) -> (57, -125)
  line L2 (57, -125) -> (57, -150)
  line L3 (57, -150) -> (67.225, -150)
  line L4 (67.225, -150) -> (67.225, -125)
  point P0 (44, 0)
extrude "Extrusion28" add sketch "Sketch30" along normal blind 30
sketch "Sketch31" plane through (0, -150, 0) normal (0, -1, 0) x (1, 0, 0)
  line L0 (-43, 13) -> (-43, 23.225) projected
  line L1 (-43, 13) -> (-26.5, 13)
  line L2 (-13, 13) -> (-43, 13) projected
  line L3 (-26.5, 13) -> (-26.5, 86)
  line L4 (-26.5, 86) -> (-21.5, 86)
  line L5 (-21.5, 86) -> (-31.5, 86)
  line L6 (-31.5, 86) -> (-31.5, 13)
  line L7 (-31.5, 13) -> (-21.5, 13)
  line L8 (-21.5, 13) -> (-21.5, 86)
  point P0 (0, 0)
  point P1 (-21.5, 13)
  point P2 (-31.5, 13)
  dimension "d170" = 16.5
  dimension "d171" = 73
  dimension "d172" = 5
  dimension "d173" = 10
  dimension "d174" = 73
extrude "Extrusion29" add sketch "Sketch31" along normal blind 12
sketch "Sketch32" plane through (-31.5, -150, 86) normal (0, 0, 1) x (1, 0, 0)
  line L0 (-11.5, 0) -> (-11.5, 25) projected
  line L1 (0, 0) -> (-11.5, 0)
  line L2 (-11.5, 0) -> (-11.5, 25)
  line L3 (-11.5, 25) -> (28.5, 25)
  line L4 (18.5, 25) -> (-11.5, 25) projected
  line L5 (28.5, 25) -> (28.5, 0)
  line L6 (40.5, 0) -> (10, 0) projected
  line L7 (0, 0) -> (-11.5, 0) projected
  line L8 (28.5, 0) -> (-11.5, 0)
  point P0 (31.5, 150)
  point P1 (10, 0)
  dimension "d177" = 25
  dimension "d178" = 40
extrude "Extrusion30" add sketch "Sketch32" against normal blind 4
sketch "Sketch33" plane through (9, -25, 13) normal (0, 0, -1) x (-1, 0, 0)
  line L0 (30.5, -137) -> (40.5, -137) projected
  line L1 (35.5, -137) -> (35.5, -125)
  line L2 (30.5, -125) -> (40.5, -125) projected
  line L3 (35.5, -125) -> (35.5, -106.75)
  line L4 (35.5, -106.75) -> (25.125, -106.75)
  line L5 (25.125, -106.75) -> (45.875, -106.75)
  circle A0 centre (25.125, -106.75) radius 1.65
  circle A1 centre (45.875, -106.75) radius 1.65
  point P0 (9, 25)
  dimension "d181" = 12
  dimension "d183" = 18.25
  dimension "d184" = 10.375
  dimension "d185" = 20.75
  dimension "d186" = 3.3
  dimension "d187" = 3.3
extrude "Extrusion31" cut sketch "Sketch33" against normal blind 400
sketch "Sketch34" plane through (-31.5, -162, 86) normal (0, 0, 1) x (1, 0, 0)
  line L0 (28.5, 37) -> (28.5, 12) projected
  line L1 (28.5, 37) -> (21.625, 37)
  line L2 (21.625, 37) -> (21.625, 12)
  line L3 (21.625, 12) -> (28.5, 12)
  line L4 (28.5, 12) -> (28.5, 37)
  point P0 (31.5, 162)
  dimension "d190" = 6.875
  dimension "d191" = 25
extrude "Extrusion32" cut sketch "Sketch34" against normal blind 4
sketch "Sketch35" plane through (-31.5, -162, 86) normal (0, 0, 1) x (1, 0, 0)
  line L0 (10, 0) -> (0, 0) projected
  line L1 (18.5, 37) -> (-11.5, 37) projected
  line L2 (10, 0) -> (0, 0)
  line L3 (0, 0) -> (0, 37)
  line L4 (0, 37) -> (10, 37)
  line L5 (10, 37) -> (10, 0)
  point P0 (31.5, 162)
  dimension "d194" = 10
extrude "Extrusion33" add sketch "Sketch35" along normal blind 4
sketch "Sketch36" plane through (-21.5, -150, 86) normal (0, 0, 1) x (1, 0, 0)
  circle A0 centre (5.375, 18.25) radius 1.65 projected
  circle A1 centre (5.375, 18.25) radius 3
  circle A2 centre (-15.375, 18.25) radius 1.65 projected
  circle A3 centre (-15.375, 18.25) radius 3
  point P0 (21.5, 150)
  dimension "d197" = 6
  dimension "d198" = 6
extrude "Extrusion34" cut sketch "Sketch36" against normal blind 3 contours A0 | A1 | A2 | A3
sketch "Sketch37" plane through (9, -25, 13) normal (0, 0, -1) x (-1, 0, 0)
  circle A0 centre (25.125, -106.75) radius 1.65 projected
  circle A1 centre (25.125, -106.75) radius 3
  circle A2 centre (45.875, -106.75) radius 1.65 projected
  circle A3 centre (45.875, -106.75) radius 3
  point P0 (9, 25)
  dimension "d201" = 6
  dimension "d202" = 6
extrude "Extrusion35" cut sketch "Sketch37" against normal blind 9.225
chamfer "Chamfer12" distance 2 angle 45 2 edges at (-21.5, -137.5, 86) (-31.5, -137.5, 86)
chamfer "Chamfer13" distance 11.5 angle 45 2 edges at (-21.5, -150, 18.1125) (-31.5, -150, 18.1125)
chamfer "Chamfer14" distance 30 angle 45 1 edges at (-13, -125, 18.1125)
sketch "Sketch38" plane through (-26.5, -140, 52.6) normal (0, 1, 0) x (1, 0, 0)
  circle A0 centre (0, 0) radius 1.7553 projected
  circle A1 centre (0, 0) radius 2.4824
  point P0 (26.5, 52.6)
extrude "Extrusion36" cut sketch "Sketch38" against normal blind 5 contours A0
properties part number "camera_mount_v3"
